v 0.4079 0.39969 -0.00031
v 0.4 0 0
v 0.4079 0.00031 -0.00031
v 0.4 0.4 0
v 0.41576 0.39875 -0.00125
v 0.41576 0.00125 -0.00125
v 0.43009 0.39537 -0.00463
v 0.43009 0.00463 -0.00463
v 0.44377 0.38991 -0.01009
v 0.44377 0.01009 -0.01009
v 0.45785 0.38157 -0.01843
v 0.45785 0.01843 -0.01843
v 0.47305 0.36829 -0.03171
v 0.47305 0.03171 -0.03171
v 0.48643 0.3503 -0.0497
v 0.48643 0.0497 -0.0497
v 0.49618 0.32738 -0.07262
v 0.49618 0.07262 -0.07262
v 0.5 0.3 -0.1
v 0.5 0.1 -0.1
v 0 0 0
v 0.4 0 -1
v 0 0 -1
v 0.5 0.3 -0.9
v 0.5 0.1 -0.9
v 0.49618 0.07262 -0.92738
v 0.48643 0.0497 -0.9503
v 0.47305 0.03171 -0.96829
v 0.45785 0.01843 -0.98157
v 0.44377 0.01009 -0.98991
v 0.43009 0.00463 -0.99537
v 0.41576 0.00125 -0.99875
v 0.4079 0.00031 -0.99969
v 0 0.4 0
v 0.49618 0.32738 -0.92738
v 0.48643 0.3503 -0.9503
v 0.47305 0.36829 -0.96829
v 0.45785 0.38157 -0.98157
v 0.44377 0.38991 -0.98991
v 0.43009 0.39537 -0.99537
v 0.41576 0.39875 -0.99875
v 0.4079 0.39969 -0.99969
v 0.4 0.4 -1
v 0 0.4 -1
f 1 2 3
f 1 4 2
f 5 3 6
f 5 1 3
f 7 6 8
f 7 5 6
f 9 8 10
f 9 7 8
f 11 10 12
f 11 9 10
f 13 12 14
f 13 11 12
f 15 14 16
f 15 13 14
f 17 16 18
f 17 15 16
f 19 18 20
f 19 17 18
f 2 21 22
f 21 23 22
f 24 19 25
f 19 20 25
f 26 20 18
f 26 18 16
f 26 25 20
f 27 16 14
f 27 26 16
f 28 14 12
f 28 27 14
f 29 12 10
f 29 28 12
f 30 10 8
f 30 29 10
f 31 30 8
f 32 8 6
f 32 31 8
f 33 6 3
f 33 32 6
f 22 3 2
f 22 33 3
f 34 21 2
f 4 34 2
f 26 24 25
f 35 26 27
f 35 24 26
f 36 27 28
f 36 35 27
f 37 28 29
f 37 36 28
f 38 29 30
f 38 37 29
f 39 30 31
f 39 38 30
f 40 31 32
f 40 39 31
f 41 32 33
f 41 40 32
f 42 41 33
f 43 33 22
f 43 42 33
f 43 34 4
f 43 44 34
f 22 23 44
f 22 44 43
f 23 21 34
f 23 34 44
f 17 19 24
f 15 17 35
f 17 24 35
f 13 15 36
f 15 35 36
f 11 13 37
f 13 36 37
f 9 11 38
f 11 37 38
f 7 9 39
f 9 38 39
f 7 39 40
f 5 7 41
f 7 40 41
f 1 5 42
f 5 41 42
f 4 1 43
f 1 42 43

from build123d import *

# Parameters (mm, degrees)
ESQUISSE1_W      = 0.5
ESQUISSE1_H      = 1
EXTRUSION1_DEPTH = 0.4
CONG_1_R         = 0.1


with BuildPart() as part:
    # Esquisse1 → Extrusion1 (new body)
    with BuildSketch(Plane(origin=(0, 0, 0), x_dir=(1, 0, 0), z_dir=(0, 1, 0))):
        with Locations((0.25, 0.5)):
            Rectangle(ESQUISSE1_W, ESQUISSE1_H)
    extrude(amount=EXTRUSION1_DEPTH)

    # Congé1
    cong_1_edges = [part.edges().sort_by_distance(p)[0] for p in [
        (0.5, 0.4, -0.5),
        (0.5, 0, -0.5),
        (0.5, 0.2, -1),
        (0.5, 0.2, 0),
    ]]
    fillet(cong_1_edges, radius=CONG_1_R)


solid = part.part
